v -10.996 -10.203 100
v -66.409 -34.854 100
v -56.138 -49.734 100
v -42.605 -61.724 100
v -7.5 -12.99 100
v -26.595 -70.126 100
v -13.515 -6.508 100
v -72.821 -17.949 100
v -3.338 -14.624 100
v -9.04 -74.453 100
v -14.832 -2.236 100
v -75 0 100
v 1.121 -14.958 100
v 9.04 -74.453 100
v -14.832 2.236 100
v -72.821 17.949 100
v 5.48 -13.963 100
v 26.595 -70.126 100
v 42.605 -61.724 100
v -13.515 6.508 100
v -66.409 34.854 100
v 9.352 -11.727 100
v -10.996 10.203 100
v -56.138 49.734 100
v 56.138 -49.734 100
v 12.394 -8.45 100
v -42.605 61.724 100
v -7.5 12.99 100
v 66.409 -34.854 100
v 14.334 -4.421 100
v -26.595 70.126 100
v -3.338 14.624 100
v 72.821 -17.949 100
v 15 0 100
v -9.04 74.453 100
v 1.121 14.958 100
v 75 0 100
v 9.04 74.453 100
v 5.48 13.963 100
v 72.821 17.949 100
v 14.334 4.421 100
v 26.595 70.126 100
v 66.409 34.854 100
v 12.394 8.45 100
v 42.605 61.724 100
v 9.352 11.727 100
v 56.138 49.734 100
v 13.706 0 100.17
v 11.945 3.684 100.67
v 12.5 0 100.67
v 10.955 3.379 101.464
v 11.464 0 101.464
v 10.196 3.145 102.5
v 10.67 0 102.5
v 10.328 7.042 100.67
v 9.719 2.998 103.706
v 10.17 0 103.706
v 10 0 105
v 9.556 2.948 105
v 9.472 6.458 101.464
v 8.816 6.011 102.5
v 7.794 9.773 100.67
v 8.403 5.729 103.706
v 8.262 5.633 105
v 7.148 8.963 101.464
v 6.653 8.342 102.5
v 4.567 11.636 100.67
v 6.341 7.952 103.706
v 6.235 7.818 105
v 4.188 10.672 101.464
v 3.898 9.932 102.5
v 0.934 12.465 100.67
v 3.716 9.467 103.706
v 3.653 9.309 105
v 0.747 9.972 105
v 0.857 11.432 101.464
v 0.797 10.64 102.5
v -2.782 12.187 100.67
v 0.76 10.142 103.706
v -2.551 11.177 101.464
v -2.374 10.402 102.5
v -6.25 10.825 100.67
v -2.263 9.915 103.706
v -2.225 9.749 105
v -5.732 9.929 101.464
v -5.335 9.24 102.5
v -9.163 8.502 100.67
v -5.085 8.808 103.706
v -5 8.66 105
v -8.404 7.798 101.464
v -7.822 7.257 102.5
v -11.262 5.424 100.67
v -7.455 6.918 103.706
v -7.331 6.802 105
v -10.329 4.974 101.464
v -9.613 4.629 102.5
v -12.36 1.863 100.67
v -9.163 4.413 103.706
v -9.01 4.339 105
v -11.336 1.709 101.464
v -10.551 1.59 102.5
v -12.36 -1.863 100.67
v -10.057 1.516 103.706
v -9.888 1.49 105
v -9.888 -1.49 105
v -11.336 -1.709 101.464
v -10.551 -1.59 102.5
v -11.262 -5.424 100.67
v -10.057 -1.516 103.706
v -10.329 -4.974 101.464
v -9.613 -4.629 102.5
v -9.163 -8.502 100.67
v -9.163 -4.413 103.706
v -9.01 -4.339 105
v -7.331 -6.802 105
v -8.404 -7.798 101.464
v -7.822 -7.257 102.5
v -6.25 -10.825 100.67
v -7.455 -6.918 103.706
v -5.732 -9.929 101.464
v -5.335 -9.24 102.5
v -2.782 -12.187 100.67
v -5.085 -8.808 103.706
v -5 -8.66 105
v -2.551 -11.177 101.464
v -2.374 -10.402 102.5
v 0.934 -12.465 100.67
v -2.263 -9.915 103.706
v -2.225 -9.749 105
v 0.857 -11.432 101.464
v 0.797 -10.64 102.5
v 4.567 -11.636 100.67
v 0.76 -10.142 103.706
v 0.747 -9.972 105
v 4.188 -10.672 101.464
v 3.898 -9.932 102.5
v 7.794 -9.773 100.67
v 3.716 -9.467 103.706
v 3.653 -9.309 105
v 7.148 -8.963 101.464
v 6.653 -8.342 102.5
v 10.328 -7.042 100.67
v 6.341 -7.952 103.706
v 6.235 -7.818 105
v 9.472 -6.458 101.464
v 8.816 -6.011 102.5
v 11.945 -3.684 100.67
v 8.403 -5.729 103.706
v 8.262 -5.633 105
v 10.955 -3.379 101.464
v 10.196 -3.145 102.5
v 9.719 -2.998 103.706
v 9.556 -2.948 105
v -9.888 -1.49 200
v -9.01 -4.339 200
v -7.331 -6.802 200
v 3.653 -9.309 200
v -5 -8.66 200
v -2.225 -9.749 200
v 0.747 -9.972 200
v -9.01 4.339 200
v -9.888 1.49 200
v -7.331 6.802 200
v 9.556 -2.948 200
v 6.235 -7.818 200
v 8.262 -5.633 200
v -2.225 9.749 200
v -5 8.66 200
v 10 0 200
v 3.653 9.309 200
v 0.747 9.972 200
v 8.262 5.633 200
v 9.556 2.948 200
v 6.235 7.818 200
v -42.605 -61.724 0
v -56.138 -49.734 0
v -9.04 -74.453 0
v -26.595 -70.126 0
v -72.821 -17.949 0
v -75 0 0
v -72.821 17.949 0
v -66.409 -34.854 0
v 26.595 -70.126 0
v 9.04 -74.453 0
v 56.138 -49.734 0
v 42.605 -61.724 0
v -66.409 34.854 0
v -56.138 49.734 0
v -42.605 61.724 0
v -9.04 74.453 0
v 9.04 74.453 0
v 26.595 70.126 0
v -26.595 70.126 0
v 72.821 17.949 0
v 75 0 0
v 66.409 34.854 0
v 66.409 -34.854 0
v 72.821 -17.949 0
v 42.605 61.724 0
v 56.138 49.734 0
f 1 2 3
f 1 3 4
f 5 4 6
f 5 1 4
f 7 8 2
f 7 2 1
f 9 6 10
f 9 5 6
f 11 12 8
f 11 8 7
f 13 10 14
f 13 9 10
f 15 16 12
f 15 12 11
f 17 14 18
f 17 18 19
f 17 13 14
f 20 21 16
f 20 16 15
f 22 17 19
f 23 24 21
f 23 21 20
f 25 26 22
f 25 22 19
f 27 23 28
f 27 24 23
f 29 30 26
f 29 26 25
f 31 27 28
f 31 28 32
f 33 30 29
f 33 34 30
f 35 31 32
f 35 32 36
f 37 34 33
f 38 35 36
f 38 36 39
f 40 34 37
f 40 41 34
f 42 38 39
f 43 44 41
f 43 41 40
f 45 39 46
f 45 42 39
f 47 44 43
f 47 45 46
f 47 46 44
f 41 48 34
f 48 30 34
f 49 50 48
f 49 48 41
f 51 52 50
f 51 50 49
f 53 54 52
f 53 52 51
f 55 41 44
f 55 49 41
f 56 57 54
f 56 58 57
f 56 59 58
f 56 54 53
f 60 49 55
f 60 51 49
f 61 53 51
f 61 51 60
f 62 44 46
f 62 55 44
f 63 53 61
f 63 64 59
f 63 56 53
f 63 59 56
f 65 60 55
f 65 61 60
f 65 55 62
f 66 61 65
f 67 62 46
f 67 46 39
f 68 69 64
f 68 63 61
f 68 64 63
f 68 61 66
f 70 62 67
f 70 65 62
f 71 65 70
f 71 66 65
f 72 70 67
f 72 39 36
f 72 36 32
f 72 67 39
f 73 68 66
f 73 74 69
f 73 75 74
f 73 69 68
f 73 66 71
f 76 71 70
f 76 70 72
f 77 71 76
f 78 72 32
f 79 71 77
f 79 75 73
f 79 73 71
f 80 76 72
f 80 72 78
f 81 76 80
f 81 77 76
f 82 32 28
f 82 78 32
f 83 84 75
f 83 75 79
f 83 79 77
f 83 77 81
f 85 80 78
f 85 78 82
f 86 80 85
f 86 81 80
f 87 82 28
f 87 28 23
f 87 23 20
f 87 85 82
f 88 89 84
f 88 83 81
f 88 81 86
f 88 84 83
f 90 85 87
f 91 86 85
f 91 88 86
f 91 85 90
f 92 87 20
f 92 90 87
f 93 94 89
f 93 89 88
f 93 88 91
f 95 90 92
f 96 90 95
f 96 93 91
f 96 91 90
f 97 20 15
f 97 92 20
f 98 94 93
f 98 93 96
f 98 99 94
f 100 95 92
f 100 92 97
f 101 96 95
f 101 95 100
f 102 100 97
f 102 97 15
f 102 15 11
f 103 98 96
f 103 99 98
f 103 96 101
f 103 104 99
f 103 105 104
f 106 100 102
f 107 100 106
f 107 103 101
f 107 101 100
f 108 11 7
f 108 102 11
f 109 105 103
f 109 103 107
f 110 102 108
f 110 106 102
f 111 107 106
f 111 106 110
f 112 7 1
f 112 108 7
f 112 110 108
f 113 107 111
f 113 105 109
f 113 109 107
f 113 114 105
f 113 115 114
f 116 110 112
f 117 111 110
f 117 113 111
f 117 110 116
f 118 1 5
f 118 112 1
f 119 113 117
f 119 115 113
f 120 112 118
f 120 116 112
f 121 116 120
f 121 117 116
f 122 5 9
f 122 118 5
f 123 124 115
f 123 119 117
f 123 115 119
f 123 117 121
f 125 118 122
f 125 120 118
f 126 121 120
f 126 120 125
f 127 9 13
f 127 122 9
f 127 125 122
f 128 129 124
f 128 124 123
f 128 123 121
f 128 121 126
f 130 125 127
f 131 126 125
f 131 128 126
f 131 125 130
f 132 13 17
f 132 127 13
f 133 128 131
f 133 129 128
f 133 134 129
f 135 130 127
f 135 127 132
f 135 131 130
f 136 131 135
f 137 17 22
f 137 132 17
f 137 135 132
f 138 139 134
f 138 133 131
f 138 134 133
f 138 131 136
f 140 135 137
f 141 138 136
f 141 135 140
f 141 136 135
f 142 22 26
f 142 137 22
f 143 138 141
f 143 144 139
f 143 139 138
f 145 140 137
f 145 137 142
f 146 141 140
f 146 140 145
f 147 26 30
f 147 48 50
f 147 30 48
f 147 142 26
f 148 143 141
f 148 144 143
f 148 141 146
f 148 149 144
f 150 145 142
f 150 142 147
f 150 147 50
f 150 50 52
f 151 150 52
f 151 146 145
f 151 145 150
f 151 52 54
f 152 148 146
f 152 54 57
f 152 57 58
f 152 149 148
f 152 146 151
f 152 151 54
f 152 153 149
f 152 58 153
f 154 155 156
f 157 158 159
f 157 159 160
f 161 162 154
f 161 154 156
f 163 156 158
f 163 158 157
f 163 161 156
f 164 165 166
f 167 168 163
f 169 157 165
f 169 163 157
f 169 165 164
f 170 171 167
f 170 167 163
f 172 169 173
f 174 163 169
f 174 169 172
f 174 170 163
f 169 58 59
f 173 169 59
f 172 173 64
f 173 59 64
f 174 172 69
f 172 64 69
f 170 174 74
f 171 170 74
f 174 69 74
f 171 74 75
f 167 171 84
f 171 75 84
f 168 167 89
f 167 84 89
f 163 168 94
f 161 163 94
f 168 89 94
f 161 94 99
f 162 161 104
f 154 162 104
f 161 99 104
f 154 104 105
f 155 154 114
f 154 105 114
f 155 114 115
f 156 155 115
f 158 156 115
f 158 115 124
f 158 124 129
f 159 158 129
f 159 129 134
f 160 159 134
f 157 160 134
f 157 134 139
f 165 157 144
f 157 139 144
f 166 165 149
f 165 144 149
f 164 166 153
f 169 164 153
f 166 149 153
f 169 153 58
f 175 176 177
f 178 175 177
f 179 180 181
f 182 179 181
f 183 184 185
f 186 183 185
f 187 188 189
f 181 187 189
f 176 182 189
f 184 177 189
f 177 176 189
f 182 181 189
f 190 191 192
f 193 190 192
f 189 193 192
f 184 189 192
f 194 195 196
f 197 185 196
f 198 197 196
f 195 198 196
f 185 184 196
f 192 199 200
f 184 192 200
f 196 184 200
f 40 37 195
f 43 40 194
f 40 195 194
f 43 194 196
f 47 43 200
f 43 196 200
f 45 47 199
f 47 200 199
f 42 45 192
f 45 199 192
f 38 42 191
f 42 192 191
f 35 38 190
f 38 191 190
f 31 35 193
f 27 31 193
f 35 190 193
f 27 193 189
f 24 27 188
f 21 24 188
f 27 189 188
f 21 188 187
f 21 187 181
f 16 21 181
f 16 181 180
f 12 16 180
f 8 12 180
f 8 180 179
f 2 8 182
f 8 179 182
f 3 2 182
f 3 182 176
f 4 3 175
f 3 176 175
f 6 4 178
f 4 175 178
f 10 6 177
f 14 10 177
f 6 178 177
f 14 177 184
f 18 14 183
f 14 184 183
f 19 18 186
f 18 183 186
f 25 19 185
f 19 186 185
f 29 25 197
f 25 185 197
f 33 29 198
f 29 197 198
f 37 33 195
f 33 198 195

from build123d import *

# Parameters (mm, degrees)
SKETCH_1_R      = 75
EXTRUDE_1_DEPTH = 100
SKETCH_2_R      = 10
EXTRUDE_2_DEPTH = 100
FILLET_1_R      = 5


with BuildPart() as part:
    # 草图1 → 凸台-拉伸1 (new body)
    with BuildSketch(Plane.XY):
        Circle(SKETCH_1_R)
    extrude(amount=EXTRUDE_1_DEPTH)

    # 草图2 → 凸台-拉伸2 (add)
    with BuildSketch(Plane.XY.offset(100)):
        Circle(SKETCH_2_R)
    extrude(amount=EXTRUDE_2_DEPTH)

    # 圆角1
    fillet_1_edges = [part.edges().sort_by_distance(p)[0] for p in [
        (-10, 0, 100),
    ]]
    fillet(fillet_1_edges, radius=FILLET_1_R)


solid = part.part
